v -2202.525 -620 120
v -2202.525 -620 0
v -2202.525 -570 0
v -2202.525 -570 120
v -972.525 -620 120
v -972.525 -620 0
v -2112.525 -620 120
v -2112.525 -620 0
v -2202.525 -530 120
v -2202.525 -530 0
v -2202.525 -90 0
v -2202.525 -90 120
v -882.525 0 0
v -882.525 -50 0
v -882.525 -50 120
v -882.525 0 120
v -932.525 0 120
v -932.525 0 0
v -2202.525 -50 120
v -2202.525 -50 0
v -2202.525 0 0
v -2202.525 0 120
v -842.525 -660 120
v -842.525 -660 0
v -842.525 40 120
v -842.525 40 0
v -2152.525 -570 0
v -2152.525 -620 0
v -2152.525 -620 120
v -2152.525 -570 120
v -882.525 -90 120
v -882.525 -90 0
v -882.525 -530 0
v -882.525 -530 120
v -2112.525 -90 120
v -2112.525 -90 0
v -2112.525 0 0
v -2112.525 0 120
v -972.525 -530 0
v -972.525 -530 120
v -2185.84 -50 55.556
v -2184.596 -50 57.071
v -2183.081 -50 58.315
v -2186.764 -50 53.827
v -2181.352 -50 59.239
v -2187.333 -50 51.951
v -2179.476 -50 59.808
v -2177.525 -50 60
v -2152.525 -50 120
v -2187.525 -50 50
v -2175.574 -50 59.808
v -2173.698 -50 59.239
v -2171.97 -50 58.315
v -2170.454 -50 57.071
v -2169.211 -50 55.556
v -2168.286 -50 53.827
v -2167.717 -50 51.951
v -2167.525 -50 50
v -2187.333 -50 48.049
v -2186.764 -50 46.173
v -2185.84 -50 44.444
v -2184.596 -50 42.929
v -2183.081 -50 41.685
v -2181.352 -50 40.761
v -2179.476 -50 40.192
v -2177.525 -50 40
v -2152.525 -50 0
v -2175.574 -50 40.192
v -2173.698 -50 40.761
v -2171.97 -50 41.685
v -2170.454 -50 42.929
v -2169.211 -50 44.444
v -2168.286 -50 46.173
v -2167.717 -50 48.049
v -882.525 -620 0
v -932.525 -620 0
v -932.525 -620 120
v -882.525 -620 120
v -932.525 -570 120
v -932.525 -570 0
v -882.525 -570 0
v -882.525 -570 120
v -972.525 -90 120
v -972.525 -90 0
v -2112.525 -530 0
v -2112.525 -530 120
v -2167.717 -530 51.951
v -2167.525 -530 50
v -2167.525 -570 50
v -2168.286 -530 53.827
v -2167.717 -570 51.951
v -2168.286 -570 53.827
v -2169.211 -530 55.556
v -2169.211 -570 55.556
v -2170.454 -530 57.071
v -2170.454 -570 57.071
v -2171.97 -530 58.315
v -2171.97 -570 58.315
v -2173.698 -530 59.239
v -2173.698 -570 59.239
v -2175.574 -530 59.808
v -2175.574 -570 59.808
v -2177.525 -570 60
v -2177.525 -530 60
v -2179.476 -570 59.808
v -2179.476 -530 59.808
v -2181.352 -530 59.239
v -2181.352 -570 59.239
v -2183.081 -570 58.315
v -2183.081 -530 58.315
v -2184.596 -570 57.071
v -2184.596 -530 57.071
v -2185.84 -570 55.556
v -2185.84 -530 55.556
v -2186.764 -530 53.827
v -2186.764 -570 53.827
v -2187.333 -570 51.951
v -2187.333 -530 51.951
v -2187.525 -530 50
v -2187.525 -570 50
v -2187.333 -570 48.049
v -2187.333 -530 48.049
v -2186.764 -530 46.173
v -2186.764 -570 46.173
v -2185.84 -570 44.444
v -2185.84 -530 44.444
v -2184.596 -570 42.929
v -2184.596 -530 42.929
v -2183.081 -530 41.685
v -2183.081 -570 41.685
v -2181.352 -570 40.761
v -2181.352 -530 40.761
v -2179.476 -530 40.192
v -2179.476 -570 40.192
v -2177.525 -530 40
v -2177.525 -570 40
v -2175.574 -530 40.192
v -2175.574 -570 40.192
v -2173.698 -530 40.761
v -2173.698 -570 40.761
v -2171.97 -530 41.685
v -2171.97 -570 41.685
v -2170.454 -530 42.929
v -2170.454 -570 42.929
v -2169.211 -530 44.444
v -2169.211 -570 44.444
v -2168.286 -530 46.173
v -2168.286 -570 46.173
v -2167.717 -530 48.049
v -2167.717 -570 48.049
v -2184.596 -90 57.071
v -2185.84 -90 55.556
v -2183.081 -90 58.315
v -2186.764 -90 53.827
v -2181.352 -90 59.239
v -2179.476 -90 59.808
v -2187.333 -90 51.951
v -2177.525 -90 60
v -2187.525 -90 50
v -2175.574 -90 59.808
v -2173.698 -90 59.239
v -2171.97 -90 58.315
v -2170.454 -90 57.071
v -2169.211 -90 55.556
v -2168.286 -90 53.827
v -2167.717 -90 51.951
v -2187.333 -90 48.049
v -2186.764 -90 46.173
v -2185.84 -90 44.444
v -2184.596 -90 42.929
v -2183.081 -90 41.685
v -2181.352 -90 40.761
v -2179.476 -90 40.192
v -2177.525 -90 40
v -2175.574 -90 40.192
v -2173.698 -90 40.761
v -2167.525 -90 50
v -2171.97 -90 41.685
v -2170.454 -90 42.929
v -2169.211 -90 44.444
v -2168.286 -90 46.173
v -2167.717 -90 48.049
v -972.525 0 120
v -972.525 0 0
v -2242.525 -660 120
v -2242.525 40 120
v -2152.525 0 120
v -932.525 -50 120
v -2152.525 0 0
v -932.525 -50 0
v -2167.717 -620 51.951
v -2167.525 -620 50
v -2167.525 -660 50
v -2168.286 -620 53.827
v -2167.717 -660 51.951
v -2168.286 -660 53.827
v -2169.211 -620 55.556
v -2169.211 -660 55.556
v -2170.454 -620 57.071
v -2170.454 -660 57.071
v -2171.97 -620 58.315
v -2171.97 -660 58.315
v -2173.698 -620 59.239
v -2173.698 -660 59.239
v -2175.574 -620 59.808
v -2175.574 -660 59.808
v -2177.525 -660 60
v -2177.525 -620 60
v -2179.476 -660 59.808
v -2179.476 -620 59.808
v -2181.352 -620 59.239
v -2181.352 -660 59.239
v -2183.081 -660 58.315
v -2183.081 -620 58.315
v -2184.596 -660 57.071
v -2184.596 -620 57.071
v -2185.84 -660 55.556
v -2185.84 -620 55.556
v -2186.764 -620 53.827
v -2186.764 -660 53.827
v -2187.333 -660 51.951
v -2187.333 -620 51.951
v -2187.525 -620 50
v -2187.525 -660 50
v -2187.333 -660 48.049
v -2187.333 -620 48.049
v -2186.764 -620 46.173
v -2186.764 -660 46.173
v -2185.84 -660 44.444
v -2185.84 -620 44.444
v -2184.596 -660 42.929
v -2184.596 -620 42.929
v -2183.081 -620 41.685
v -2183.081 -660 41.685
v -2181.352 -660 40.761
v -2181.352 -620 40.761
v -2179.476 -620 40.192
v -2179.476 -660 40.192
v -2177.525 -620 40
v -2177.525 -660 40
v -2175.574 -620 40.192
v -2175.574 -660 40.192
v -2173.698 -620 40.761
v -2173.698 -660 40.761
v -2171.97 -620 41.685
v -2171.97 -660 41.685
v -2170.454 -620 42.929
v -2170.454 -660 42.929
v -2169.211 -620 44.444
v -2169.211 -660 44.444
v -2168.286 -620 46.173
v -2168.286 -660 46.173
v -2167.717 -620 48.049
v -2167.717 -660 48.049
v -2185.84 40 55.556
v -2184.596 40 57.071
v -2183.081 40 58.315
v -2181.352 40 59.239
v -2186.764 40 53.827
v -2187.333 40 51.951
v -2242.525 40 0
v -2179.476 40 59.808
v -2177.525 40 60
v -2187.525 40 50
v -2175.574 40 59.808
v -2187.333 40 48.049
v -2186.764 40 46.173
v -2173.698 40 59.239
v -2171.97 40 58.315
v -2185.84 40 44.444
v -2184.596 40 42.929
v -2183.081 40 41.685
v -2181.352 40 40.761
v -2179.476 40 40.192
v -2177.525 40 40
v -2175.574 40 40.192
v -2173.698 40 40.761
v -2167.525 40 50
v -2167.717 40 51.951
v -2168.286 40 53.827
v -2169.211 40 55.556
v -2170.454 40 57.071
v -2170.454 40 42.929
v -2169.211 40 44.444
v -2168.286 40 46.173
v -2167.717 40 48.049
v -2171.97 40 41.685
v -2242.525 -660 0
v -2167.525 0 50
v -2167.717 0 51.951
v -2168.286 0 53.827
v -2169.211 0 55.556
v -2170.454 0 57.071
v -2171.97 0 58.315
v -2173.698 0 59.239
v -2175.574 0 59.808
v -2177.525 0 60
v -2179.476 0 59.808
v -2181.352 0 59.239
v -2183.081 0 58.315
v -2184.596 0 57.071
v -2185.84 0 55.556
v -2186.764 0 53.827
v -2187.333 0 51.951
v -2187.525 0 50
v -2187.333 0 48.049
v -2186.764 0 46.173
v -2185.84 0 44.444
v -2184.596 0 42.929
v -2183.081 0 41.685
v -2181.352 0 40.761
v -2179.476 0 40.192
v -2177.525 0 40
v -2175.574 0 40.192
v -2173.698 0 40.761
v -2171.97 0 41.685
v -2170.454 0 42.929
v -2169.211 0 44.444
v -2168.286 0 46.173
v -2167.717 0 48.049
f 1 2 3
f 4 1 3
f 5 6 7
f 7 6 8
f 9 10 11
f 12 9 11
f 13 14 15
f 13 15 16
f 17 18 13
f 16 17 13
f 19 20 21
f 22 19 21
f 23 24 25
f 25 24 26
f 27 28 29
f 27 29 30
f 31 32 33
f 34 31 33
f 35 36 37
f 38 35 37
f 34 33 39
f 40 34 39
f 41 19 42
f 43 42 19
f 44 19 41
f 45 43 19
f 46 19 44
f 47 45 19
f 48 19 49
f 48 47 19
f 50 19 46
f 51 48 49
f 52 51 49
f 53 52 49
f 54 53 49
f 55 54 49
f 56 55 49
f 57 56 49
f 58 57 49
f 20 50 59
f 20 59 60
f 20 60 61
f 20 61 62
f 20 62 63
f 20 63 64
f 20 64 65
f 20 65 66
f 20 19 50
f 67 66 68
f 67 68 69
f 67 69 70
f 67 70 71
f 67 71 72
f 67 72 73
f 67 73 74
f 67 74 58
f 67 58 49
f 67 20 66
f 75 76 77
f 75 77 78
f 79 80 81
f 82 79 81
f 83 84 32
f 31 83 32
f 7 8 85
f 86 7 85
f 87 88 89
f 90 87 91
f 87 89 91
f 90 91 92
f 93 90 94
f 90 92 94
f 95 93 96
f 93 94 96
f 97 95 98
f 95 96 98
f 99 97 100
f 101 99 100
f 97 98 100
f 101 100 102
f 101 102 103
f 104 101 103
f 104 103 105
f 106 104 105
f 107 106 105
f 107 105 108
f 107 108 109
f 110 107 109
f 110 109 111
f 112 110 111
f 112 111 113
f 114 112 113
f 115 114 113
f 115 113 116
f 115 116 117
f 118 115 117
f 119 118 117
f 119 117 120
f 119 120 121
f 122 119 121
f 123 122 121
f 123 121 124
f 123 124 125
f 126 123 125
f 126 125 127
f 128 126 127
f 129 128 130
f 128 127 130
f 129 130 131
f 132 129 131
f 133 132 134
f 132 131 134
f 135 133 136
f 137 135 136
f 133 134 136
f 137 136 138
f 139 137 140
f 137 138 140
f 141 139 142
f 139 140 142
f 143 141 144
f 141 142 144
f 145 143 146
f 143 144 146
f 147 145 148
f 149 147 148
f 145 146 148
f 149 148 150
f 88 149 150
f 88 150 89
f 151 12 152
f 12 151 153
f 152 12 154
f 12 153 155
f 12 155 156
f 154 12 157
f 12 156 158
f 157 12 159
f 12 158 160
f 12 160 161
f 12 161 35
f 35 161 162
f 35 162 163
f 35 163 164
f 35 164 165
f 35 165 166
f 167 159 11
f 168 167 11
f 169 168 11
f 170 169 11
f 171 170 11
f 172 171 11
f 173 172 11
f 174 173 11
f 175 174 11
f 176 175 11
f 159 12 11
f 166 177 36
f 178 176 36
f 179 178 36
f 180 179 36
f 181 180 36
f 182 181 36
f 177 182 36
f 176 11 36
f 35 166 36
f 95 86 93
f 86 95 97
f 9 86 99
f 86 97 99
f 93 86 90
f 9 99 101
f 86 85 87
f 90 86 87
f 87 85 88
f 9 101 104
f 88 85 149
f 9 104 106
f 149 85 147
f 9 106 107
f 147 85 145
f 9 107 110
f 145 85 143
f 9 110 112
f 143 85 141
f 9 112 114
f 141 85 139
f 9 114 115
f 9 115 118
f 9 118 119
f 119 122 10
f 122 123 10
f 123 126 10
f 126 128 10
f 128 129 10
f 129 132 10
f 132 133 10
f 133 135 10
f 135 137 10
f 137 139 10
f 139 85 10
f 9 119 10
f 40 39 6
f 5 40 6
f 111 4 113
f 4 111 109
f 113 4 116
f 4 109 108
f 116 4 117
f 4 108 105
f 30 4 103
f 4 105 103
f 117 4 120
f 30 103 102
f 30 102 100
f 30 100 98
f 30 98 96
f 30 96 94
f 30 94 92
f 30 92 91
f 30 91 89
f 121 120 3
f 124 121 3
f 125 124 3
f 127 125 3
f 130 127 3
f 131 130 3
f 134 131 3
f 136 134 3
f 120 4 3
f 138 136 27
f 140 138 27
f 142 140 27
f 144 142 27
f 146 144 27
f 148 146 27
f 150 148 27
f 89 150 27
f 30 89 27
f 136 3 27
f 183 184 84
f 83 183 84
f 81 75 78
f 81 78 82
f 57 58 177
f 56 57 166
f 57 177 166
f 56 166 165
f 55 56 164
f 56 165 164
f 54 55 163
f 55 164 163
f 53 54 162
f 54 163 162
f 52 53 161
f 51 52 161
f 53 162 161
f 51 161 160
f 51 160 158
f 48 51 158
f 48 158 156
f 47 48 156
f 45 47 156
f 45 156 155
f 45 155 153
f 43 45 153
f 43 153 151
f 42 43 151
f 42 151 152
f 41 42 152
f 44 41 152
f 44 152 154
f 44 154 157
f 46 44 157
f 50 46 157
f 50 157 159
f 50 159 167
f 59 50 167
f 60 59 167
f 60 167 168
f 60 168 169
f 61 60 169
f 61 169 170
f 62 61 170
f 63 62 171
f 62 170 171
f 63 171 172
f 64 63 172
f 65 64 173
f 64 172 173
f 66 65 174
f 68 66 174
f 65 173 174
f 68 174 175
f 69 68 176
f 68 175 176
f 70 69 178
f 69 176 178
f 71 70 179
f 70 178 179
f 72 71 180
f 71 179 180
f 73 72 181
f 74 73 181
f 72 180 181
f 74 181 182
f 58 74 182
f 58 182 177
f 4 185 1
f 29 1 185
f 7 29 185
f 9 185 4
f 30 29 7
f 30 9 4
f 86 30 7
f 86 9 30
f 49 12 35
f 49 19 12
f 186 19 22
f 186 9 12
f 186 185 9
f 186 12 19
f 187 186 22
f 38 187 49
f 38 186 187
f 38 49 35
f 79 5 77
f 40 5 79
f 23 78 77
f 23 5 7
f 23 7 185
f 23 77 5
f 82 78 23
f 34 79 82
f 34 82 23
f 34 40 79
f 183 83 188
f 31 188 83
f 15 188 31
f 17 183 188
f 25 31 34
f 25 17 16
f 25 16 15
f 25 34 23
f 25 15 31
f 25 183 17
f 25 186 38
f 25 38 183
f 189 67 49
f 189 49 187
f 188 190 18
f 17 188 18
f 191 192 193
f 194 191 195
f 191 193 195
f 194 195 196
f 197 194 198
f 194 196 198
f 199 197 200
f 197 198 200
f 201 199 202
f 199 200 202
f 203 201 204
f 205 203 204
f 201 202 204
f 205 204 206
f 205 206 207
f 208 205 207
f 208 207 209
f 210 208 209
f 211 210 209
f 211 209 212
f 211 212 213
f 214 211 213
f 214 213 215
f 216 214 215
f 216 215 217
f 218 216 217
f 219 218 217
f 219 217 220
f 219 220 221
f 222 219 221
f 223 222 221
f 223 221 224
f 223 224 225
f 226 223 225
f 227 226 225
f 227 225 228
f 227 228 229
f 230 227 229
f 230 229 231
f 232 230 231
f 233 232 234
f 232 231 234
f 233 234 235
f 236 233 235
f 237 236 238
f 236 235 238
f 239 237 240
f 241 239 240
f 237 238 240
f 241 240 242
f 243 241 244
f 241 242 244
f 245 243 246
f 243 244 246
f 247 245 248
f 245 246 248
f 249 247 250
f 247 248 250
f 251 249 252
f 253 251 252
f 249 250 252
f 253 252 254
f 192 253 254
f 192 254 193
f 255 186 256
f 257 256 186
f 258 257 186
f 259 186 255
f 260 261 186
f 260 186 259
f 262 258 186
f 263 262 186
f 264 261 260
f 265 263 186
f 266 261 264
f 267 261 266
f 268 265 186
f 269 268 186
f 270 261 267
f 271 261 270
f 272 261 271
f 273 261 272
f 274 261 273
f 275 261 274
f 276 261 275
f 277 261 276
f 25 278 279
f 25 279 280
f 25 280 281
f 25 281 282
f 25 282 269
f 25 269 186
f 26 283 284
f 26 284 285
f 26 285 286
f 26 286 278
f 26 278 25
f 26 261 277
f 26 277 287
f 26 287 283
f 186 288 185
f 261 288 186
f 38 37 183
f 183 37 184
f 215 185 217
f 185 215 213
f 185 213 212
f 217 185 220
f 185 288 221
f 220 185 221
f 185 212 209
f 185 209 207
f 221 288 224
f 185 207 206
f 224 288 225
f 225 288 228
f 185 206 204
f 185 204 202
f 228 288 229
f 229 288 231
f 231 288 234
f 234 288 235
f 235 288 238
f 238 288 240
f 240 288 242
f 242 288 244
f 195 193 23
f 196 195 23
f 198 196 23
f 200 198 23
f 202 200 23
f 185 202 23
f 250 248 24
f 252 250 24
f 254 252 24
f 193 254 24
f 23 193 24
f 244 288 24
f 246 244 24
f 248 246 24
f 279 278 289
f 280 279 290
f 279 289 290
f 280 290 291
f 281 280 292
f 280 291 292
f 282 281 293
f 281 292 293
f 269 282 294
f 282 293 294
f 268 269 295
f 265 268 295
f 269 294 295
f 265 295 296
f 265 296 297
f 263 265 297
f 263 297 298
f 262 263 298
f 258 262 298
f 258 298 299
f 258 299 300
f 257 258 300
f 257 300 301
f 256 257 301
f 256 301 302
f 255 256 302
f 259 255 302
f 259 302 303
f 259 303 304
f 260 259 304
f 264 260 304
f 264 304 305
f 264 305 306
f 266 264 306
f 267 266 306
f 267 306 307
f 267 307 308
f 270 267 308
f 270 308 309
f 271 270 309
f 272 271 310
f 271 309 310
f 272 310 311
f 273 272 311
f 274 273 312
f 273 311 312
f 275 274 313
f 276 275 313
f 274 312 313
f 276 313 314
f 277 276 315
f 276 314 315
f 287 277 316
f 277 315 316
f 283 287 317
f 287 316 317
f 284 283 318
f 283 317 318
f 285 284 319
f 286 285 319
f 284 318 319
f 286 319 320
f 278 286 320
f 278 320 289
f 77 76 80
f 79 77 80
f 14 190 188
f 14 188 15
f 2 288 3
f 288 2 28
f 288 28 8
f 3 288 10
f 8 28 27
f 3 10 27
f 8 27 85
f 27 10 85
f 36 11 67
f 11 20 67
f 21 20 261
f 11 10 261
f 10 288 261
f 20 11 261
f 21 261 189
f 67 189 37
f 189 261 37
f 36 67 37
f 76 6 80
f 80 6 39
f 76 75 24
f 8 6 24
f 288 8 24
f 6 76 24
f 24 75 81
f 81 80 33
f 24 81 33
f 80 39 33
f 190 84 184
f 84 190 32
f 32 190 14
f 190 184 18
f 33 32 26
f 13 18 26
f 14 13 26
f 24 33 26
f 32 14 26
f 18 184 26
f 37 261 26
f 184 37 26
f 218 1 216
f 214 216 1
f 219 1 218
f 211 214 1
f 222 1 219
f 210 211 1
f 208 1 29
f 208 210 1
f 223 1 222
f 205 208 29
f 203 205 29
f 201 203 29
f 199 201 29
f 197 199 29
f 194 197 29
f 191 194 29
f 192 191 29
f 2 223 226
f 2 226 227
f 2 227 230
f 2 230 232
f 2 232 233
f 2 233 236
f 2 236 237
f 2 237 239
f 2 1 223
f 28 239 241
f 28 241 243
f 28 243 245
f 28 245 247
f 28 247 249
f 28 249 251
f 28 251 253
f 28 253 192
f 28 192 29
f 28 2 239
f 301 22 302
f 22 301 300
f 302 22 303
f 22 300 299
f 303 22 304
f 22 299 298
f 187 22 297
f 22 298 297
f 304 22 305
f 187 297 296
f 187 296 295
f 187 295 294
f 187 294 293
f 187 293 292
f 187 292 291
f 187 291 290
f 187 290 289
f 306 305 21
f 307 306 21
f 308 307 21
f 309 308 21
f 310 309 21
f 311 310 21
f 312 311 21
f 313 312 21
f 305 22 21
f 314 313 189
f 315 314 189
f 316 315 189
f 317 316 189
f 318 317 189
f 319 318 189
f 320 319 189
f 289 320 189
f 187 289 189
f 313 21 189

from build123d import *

# Parameters (mm, degrees)
F0_W     = 1400
F0_H     = 700
F0_W_2   = 50
F0_H_2   = 50
F1_DEPTH = 120
F2_R     = 10
F3_DEPTH = 1000


with BuildPart() as f1:
    # F0 (on Top) → F1 (new body)
    with BuildSketch(Plane.XY):
        with Locations((-1542.525277, -310)):
            Rectangle(F0_W, F0_H)
        with Locations((-2177.525277, -595)):
            Rectangle(F0_W_2, F0_H_2, mode=Mode.SUBTRACT)
        with Locations((-907.525277, -595)):
            Rectangle(F0_W_2, F0_H_2, mode=Mode.SUBTRACT)
        with Locations((-2177.525277, -25)):
            Rectangle(F0_W_2, F0_H_2, mode=Mode.SUBTRACT)
        Polygon((-2202.525277, -530), (-2202.525277, -90), (-2112.525277, -90), (-2112.525277, 0), (-972.525277, 0), (-972.525277, -90), (-882.525277, -90), (-882.525277, -530), (-972.525277, -530), (-972.525277, -620), (-2112.525277, -620), (-2112.525277, -530), align=None, mode=Mode.SUBTRACT)
        with Locations((-907.525277, -25)):
            Rectangle(F0_W_2, F0_H_2, mode=Mode.SUBTRACT)
    extrude(amount=F1_DEPTH)

    # F2 (on face) → F3 (cut)
    with BuildSketch(Plane.XZ.offset(660)):
        with Locations((-2177.525277, 50)):
            Circle(F2_R)
    extrude(amount=-F3_DEPTH, mode=Mode.SUBTRACT)


solid = f1.part
